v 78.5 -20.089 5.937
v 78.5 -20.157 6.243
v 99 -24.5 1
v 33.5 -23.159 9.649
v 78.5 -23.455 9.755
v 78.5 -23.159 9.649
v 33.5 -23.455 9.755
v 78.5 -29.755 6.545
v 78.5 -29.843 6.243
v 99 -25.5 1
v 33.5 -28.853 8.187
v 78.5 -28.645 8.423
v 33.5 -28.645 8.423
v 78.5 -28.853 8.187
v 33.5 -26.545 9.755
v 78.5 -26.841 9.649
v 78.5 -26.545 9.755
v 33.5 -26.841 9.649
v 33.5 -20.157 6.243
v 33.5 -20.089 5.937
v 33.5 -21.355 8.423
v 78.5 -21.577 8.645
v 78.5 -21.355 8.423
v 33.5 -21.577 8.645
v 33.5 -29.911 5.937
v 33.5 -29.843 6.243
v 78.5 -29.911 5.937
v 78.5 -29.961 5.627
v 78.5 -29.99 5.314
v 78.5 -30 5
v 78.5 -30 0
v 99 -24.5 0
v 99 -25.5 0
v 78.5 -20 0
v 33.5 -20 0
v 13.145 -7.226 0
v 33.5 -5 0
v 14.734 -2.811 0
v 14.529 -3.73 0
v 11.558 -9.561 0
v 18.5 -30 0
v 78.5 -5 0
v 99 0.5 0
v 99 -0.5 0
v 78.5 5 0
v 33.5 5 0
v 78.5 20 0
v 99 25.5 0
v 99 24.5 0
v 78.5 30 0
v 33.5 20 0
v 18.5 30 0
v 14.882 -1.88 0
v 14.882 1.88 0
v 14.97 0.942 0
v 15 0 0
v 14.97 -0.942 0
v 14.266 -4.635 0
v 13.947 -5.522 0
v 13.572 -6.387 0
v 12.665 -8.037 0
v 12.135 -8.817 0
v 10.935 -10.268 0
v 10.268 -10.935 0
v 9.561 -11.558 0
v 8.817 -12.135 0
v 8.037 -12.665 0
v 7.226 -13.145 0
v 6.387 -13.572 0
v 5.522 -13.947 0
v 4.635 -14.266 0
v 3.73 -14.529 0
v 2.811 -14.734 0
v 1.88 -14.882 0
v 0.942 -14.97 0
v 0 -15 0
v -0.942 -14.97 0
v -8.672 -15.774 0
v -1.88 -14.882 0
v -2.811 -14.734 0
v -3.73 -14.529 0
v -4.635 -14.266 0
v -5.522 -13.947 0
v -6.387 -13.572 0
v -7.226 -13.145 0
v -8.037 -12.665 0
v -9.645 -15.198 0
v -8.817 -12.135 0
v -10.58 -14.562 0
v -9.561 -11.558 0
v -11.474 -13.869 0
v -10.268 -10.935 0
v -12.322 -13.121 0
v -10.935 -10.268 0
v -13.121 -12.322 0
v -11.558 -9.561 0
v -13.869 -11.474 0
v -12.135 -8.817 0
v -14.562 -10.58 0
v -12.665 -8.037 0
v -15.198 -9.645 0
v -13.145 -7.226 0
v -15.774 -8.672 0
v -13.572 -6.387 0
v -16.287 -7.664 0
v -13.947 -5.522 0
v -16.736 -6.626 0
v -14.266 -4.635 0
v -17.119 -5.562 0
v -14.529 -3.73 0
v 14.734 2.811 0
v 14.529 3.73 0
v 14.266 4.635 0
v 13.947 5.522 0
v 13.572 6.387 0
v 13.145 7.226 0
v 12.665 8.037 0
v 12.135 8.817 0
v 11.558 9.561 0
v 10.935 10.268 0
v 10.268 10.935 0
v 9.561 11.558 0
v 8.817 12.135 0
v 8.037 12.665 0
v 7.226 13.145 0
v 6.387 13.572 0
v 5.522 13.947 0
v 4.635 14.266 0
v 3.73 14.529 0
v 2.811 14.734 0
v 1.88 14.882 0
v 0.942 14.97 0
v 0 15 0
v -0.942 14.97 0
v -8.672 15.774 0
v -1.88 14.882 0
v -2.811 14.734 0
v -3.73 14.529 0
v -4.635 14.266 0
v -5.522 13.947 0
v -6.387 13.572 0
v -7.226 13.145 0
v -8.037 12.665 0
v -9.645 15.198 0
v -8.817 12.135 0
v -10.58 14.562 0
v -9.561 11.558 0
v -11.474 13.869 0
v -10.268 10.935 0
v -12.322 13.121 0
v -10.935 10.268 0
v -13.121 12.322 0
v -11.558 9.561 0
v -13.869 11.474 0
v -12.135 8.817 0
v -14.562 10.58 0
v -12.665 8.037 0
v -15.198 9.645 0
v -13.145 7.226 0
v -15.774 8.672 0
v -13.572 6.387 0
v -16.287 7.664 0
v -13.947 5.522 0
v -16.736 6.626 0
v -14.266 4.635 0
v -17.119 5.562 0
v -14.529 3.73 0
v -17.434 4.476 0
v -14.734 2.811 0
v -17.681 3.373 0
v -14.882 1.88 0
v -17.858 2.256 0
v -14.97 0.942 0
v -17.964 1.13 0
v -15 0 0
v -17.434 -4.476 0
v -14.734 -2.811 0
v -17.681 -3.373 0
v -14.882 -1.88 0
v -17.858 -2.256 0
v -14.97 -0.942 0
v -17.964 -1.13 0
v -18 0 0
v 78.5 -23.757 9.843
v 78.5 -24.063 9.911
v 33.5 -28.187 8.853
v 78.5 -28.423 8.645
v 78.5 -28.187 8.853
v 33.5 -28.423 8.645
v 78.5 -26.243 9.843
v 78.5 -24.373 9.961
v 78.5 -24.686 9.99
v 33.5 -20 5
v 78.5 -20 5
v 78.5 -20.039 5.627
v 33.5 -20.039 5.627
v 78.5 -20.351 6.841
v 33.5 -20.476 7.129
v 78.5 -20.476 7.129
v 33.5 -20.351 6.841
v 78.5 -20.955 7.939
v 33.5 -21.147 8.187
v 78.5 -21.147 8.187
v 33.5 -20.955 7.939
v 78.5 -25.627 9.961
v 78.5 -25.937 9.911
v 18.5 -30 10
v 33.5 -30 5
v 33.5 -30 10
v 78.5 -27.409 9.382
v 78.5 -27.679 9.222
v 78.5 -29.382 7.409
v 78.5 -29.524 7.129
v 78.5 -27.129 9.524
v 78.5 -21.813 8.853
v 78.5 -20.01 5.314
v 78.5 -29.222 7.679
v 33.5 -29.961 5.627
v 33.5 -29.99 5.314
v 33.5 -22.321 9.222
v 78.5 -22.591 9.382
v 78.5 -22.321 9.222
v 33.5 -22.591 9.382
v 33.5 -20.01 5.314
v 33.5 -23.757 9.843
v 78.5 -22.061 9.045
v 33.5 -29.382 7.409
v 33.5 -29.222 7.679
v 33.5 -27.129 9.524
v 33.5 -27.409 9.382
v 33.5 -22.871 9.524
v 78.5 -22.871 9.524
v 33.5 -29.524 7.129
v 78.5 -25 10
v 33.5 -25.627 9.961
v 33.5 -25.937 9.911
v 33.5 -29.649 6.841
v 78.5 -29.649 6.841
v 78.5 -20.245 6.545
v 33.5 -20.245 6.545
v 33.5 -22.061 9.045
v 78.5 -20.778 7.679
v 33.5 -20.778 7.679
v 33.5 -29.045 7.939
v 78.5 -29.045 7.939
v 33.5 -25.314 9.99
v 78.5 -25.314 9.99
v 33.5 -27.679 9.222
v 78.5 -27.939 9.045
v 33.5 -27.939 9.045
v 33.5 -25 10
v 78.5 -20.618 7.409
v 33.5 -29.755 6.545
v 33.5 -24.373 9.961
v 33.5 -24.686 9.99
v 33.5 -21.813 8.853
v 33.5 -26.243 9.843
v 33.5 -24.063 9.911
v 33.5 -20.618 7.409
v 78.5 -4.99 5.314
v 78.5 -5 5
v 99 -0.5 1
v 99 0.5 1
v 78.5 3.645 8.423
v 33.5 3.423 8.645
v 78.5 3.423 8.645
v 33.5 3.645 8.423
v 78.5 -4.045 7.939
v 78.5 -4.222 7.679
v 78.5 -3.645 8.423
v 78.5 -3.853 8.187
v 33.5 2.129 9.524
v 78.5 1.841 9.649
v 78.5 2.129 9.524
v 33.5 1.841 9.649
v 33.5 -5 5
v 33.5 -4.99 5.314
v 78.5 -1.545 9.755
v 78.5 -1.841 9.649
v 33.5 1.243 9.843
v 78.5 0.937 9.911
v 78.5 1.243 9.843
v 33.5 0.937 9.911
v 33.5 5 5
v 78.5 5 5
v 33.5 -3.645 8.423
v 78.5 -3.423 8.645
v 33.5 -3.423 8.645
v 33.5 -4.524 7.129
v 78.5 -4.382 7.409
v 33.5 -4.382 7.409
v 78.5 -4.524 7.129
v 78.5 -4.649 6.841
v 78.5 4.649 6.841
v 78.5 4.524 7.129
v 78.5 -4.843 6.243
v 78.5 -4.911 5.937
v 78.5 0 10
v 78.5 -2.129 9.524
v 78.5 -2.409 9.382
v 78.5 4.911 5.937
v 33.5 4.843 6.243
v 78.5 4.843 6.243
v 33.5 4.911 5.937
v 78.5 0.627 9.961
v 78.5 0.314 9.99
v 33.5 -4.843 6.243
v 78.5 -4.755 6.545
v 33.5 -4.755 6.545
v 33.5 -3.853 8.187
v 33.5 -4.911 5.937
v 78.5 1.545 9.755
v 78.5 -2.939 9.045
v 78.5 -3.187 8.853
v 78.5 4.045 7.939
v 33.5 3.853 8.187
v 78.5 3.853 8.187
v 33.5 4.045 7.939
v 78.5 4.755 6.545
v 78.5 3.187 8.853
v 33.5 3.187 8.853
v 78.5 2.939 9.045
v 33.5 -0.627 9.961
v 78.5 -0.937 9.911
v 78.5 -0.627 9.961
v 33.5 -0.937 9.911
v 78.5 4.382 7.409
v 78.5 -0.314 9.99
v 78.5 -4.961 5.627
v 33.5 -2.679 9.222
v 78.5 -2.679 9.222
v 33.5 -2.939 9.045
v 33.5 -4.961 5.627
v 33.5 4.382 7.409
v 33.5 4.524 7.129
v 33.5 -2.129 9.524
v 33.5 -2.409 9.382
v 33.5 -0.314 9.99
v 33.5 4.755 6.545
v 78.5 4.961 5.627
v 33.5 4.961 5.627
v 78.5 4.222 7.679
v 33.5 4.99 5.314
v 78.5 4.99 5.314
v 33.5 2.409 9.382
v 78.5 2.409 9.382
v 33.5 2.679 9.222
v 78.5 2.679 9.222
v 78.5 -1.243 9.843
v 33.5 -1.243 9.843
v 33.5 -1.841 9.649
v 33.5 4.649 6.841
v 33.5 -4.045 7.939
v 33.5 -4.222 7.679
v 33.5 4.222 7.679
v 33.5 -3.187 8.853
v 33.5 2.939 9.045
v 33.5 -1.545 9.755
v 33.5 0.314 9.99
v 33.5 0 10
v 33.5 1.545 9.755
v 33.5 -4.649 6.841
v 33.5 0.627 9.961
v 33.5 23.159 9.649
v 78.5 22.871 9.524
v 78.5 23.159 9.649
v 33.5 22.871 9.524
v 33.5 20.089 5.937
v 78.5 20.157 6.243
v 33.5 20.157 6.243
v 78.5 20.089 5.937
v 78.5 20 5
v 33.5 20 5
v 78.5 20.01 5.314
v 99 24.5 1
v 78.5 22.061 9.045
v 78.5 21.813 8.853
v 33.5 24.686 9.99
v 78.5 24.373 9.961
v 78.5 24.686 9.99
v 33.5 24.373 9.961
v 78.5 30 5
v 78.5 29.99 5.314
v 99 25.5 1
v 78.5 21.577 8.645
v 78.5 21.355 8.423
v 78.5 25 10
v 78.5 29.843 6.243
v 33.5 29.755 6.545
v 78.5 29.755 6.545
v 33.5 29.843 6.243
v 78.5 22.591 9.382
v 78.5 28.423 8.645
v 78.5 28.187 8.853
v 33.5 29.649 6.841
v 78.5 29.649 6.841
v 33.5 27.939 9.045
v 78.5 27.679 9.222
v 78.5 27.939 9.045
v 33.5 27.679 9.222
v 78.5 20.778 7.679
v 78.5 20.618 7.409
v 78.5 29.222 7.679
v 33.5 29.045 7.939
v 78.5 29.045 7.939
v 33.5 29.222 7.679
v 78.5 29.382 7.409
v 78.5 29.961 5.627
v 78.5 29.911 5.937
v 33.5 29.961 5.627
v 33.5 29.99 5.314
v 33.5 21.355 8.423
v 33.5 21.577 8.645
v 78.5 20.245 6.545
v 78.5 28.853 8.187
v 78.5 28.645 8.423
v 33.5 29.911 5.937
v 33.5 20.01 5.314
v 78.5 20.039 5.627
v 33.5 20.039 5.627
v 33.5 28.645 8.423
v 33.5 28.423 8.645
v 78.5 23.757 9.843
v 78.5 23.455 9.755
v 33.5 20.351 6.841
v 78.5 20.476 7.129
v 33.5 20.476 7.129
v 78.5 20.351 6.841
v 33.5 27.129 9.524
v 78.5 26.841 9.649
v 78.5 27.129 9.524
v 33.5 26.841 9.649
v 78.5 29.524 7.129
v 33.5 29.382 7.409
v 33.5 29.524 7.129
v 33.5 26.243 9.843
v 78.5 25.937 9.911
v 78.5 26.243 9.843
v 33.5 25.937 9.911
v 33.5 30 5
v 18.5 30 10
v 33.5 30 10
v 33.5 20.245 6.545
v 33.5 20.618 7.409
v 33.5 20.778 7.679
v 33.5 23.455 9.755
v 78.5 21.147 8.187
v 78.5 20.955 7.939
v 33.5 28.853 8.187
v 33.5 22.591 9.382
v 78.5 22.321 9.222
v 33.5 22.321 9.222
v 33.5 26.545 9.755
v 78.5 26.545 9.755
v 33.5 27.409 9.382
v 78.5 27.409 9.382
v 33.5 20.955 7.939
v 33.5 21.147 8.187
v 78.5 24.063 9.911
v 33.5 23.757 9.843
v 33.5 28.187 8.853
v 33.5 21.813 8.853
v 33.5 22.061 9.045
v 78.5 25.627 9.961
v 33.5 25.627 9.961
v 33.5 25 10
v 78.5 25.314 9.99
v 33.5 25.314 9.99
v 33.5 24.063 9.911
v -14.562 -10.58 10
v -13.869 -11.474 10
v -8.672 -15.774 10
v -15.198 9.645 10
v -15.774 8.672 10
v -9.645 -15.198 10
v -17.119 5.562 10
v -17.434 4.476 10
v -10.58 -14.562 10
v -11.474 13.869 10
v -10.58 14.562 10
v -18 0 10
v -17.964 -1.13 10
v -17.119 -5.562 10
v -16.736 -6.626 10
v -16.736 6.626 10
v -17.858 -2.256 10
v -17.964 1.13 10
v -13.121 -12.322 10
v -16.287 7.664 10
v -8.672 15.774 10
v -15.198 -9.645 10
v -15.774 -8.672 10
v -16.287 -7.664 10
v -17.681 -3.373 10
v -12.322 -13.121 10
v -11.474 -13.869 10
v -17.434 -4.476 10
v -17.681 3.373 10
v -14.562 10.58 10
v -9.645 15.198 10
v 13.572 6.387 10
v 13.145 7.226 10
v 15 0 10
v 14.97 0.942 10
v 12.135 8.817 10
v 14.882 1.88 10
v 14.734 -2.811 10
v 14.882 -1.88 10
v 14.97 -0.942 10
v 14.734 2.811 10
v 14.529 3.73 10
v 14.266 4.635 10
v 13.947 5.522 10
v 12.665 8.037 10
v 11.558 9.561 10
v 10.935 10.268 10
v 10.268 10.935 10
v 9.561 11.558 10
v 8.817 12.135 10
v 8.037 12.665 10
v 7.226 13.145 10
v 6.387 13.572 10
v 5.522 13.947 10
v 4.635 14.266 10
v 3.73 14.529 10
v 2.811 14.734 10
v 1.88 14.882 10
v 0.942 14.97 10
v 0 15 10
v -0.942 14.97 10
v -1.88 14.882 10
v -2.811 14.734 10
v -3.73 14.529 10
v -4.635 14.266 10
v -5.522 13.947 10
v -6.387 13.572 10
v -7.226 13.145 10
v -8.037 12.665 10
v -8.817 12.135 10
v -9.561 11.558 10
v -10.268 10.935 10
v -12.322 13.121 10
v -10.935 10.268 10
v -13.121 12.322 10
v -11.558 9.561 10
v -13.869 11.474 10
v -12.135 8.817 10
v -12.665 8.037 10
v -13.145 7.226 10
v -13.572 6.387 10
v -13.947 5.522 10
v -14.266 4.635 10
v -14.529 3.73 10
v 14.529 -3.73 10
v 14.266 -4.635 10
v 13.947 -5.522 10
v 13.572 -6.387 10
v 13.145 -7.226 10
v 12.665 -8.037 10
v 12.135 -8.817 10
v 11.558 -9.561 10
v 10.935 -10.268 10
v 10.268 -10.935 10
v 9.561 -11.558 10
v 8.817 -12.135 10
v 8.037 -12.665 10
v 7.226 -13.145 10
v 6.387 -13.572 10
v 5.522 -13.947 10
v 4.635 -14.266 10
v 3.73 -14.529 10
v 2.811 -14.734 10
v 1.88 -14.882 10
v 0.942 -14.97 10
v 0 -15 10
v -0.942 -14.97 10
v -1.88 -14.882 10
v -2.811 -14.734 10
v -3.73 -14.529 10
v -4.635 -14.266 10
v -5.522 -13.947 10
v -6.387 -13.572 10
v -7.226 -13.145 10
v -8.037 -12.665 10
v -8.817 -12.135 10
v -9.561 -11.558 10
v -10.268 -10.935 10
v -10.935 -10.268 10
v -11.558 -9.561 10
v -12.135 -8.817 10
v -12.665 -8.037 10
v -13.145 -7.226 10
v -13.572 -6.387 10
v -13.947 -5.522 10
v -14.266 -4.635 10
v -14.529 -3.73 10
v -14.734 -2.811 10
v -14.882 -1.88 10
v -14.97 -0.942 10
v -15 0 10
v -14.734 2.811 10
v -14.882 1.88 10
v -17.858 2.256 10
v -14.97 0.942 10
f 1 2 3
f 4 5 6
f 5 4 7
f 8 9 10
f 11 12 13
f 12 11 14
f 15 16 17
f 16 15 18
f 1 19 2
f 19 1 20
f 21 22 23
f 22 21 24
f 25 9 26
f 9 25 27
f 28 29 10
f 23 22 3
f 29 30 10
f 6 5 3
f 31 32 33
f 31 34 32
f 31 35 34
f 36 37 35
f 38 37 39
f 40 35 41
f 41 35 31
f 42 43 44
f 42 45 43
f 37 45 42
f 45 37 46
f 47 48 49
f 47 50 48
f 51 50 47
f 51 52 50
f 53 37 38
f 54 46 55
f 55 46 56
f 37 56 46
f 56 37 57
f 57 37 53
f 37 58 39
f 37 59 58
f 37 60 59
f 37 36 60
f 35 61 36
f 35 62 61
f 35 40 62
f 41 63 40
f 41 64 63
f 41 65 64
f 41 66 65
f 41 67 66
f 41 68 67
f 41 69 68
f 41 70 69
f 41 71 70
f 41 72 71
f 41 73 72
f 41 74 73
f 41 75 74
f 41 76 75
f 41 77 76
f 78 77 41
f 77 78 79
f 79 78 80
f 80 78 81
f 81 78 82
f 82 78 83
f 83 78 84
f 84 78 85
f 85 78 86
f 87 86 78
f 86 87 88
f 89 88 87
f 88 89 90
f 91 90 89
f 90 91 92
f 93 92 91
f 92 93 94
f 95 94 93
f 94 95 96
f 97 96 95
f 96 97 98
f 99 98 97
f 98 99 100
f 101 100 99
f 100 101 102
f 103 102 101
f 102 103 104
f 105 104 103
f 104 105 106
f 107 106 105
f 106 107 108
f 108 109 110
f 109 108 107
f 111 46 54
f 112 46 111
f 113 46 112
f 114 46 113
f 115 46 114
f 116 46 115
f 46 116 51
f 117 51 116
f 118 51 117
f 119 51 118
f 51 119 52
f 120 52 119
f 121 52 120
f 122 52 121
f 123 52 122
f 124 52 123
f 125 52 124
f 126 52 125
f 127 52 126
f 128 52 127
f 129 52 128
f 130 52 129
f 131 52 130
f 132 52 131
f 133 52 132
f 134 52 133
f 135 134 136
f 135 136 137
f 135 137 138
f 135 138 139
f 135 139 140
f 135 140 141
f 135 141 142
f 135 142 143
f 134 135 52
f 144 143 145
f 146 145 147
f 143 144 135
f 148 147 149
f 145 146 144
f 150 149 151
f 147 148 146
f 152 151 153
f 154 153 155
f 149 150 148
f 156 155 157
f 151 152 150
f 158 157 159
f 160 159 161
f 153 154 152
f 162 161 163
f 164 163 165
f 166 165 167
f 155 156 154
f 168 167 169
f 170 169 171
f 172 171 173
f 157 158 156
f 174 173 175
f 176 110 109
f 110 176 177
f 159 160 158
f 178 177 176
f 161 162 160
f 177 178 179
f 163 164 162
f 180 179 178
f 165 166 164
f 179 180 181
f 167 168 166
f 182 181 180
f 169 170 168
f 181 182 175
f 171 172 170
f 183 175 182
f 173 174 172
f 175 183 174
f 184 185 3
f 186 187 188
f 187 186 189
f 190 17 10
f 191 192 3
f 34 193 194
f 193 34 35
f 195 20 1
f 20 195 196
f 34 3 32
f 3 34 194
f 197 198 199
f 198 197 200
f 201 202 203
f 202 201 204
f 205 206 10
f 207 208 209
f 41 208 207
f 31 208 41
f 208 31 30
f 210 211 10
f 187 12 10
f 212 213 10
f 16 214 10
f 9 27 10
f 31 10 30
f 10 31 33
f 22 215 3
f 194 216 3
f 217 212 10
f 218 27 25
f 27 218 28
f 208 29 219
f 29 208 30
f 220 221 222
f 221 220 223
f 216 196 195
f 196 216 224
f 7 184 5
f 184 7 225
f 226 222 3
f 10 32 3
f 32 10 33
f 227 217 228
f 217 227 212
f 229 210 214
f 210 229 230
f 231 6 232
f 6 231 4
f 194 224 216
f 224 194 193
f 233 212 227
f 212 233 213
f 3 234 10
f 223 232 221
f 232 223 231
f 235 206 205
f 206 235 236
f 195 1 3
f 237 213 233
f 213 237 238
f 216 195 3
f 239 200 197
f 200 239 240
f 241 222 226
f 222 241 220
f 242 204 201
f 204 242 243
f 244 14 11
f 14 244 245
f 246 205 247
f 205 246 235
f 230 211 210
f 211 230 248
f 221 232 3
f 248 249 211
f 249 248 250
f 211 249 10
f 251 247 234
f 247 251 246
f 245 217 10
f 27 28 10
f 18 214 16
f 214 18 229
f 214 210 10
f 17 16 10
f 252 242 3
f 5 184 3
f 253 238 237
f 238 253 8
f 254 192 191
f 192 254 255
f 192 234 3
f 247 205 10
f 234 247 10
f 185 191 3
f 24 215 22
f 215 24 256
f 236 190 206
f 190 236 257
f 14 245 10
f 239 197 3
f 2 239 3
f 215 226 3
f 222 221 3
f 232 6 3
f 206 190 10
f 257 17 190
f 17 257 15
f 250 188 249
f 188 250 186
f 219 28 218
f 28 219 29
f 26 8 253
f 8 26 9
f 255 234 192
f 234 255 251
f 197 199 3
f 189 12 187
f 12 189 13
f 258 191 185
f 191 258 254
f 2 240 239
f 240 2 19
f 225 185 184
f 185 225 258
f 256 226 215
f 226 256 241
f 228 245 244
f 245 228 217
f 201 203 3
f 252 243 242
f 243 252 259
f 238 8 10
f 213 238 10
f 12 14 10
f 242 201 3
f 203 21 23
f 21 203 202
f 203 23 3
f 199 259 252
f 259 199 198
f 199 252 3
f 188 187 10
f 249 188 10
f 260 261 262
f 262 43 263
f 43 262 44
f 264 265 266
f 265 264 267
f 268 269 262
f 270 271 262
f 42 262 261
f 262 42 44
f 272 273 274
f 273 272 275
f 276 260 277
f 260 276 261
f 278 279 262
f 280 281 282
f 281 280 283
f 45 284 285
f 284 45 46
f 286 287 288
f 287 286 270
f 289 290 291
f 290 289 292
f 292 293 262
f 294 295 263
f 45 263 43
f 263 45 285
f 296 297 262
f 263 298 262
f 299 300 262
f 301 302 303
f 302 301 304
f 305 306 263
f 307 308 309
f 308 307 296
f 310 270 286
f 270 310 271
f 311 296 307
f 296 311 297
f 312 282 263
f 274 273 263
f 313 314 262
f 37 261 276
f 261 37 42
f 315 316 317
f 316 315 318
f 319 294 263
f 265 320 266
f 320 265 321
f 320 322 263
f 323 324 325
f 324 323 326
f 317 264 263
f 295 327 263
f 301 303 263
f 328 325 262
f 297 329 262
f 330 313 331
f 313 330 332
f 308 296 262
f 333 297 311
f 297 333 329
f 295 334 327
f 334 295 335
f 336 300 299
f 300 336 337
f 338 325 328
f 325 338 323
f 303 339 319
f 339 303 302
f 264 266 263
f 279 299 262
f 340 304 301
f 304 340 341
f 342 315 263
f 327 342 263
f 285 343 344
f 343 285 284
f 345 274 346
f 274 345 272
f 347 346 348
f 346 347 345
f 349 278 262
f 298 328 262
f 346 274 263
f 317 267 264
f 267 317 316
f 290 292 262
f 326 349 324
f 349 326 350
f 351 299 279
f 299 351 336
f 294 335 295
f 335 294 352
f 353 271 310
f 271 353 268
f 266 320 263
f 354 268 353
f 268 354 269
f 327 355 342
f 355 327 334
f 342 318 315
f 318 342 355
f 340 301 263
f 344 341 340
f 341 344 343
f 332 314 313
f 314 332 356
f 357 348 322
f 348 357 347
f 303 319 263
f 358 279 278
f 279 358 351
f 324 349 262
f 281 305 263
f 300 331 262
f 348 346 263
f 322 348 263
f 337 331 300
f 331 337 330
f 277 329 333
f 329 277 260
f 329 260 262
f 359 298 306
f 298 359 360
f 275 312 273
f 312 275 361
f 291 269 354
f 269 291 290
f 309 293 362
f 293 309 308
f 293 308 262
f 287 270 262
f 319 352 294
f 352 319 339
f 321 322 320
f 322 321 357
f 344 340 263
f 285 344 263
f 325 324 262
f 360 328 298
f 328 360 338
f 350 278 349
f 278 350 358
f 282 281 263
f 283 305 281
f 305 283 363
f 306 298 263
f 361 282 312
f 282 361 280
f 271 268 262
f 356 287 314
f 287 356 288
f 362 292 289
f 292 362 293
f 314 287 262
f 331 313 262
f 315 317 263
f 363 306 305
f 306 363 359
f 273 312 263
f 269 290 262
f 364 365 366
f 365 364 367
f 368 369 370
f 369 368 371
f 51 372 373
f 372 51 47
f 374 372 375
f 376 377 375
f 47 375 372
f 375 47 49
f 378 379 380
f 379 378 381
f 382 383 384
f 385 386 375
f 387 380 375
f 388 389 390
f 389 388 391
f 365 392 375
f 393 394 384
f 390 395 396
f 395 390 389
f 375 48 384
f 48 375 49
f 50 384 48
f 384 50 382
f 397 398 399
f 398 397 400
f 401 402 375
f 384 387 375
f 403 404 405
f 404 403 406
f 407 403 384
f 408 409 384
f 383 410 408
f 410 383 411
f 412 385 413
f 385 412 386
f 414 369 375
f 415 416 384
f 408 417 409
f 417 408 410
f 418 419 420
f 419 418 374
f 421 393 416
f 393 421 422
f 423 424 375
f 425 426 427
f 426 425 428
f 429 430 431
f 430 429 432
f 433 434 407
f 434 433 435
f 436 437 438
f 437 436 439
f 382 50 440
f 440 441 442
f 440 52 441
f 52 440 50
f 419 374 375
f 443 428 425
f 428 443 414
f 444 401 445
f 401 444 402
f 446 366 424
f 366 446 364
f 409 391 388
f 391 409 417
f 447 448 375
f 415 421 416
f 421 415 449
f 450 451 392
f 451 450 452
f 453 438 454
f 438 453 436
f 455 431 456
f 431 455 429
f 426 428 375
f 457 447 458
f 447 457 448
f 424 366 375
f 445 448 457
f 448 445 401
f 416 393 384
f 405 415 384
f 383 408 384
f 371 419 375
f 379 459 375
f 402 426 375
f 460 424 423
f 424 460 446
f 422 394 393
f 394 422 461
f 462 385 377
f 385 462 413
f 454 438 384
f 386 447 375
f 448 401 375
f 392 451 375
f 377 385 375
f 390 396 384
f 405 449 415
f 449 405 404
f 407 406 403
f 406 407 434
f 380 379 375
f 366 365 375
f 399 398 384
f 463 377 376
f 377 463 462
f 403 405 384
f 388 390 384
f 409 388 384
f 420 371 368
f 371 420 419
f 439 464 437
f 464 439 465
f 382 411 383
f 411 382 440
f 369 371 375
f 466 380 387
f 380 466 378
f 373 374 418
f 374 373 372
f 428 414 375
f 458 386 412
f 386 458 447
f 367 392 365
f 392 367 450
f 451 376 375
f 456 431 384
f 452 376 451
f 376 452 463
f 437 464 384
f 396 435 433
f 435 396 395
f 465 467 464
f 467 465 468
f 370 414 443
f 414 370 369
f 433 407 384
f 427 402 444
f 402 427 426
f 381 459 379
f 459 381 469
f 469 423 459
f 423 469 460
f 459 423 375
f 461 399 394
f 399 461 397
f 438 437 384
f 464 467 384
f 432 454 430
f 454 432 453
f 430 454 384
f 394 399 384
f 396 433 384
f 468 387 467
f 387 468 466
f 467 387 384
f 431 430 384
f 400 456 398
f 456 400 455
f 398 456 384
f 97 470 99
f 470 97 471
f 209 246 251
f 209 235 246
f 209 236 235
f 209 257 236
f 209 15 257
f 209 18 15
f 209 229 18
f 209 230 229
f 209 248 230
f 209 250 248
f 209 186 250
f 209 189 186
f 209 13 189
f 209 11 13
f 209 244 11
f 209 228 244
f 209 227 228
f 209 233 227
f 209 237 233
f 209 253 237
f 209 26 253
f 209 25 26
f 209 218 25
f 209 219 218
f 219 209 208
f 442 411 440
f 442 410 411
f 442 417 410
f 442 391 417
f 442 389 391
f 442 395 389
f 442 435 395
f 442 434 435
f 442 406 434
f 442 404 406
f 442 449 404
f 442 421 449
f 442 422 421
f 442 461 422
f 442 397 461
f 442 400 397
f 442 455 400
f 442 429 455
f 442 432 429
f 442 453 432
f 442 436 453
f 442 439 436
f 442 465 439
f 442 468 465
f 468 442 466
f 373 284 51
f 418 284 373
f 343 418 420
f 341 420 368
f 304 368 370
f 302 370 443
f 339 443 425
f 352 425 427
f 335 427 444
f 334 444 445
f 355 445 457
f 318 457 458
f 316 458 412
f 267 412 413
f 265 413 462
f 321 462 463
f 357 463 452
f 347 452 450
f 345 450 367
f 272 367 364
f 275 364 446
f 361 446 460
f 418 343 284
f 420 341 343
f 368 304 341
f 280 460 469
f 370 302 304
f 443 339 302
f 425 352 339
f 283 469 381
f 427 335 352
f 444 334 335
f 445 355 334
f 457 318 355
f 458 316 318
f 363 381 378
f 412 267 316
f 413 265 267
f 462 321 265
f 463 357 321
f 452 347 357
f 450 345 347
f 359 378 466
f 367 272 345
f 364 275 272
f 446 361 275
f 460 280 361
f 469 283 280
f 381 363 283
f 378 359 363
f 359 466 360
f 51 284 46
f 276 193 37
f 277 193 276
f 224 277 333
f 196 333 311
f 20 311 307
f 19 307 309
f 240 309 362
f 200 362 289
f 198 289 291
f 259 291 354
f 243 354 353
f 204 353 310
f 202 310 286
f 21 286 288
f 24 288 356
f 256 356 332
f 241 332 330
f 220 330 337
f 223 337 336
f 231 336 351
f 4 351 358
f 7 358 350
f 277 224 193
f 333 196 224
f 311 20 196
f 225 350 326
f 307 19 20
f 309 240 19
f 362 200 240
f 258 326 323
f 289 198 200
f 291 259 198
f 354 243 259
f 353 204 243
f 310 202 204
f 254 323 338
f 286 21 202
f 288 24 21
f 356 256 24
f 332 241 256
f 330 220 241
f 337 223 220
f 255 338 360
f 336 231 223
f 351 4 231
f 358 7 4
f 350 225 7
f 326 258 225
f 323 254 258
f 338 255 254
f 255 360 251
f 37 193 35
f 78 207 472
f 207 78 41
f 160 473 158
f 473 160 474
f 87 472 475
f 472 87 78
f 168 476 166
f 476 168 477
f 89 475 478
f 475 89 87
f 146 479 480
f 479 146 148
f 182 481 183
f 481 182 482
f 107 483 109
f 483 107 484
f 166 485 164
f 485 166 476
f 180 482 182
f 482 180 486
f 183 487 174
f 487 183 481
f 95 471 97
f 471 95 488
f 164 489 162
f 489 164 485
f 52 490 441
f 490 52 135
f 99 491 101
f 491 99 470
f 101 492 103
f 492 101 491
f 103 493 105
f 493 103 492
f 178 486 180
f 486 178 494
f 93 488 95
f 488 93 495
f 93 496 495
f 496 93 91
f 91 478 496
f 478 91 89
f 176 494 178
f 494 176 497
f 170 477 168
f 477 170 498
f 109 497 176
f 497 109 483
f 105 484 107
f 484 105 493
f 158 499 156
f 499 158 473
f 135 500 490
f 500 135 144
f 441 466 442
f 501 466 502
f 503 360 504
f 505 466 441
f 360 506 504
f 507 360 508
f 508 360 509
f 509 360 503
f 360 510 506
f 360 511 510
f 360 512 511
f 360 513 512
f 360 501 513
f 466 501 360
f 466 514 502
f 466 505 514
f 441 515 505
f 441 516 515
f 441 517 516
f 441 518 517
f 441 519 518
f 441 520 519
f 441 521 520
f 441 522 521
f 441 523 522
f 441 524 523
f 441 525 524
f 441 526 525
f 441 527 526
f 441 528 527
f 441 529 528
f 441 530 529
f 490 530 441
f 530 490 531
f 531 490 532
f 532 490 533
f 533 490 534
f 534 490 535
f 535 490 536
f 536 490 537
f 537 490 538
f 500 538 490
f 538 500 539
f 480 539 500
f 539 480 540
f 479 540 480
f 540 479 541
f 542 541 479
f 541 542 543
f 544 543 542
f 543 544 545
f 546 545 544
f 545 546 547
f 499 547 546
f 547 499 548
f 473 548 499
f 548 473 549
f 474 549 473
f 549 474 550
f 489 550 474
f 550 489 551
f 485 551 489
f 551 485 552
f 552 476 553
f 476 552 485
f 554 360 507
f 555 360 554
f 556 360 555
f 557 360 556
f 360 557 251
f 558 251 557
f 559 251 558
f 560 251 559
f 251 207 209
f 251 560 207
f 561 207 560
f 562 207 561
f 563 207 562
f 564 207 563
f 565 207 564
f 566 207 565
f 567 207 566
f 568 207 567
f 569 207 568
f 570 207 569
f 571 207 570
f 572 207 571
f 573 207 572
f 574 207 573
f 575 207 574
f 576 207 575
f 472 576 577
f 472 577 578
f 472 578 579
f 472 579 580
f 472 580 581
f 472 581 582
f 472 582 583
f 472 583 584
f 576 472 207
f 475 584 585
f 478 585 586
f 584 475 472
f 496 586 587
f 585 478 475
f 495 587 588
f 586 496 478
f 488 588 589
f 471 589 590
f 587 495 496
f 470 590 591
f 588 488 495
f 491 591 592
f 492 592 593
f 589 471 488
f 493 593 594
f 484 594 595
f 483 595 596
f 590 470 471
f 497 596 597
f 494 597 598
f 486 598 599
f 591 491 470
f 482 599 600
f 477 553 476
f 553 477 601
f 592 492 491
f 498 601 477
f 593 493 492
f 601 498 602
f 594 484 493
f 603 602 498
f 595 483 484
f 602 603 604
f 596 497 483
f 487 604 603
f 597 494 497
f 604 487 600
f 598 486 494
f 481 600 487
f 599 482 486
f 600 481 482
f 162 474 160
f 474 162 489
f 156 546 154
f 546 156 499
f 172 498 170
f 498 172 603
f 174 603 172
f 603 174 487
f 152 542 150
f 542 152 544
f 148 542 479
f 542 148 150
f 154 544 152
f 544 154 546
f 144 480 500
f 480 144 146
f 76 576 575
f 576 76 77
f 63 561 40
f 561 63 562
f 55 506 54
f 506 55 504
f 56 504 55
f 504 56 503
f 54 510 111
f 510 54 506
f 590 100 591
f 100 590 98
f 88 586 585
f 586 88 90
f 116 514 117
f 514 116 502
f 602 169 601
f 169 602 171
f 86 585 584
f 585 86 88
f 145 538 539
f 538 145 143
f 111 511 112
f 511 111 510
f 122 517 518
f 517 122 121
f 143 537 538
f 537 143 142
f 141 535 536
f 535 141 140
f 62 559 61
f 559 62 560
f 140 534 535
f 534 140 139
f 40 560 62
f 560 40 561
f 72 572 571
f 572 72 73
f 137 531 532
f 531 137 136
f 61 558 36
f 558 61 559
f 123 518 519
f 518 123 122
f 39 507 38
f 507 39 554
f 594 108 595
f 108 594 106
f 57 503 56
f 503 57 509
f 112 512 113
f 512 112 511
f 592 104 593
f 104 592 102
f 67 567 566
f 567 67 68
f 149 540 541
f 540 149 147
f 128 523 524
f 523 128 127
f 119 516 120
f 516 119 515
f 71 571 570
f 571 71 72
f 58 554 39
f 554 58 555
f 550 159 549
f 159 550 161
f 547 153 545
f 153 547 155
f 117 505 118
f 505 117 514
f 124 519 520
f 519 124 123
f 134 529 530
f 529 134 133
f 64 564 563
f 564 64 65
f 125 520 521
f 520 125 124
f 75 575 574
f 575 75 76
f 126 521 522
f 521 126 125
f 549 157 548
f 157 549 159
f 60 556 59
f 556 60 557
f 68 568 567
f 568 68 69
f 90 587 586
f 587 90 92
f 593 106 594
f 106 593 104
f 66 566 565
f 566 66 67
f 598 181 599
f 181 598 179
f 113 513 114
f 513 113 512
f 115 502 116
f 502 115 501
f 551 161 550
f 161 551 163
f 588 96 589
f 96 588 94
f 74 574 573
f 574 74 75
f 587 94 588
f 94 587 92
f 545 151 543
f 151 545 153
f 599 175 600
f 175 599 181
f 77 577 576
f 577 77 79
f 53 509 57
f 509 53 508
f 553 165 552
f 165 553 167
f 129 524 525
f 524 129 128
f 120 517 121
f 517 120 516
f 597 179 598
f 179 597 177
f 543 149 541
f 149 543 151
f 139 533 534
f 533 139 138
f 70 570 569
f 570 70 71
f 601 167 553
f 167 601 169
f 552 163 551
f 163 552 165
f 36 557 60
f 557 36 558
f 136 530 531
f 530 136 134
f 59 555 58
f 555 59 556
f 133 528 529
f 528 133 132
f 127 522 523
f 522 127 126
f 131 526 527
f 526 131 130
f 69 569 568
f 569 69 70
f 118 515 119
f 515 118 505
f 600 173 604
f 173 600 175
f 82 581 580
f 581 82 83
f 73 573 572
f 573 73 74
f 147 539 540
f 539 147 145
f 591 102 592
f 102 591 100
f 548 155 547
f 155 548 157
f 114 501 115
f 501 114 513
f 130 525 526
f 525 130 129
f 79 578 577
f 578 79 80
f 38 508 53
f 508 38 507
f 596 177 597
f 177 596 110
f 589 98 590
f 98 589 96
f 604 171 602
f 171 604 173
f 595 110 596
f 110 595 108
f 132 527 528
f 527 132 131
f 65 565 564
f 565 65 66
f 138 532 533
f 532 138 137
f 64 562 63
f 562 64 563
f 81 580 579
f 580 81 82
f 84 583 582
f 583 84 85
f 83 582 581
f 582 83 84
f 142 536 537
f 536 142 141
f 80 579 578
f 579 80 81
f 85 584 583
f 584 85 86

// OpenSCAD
//custom rake

// diameter handle
d=30;
// thickness of handle holder
t=3;
// height of handle holder
h=10;

// number of teeth +1
n=2;
// radius of teeth
r=5;
//spacing of teeth
s=15;
//length of teeth
l=50;
// pointiness
p=20;


//calls

translate([12,-n/2*(2*r+s),0])rake();
handleholder();

module handleholder(){
difference(){
hull(){
translate([d*2/3+t*2,0,h/2])cube([d/2,n*(2*r+s)+2*r,h],center=true); //manifold
translate([0,0,h/2])cylinder(h,d/2+t,d/2+t,center=true,$fn=100);
		}
	translate([0,0,h/2])cylinder(h+1,d/2,d/2,center=true,$fn=100);
			}
				}
					


module rake(){
	for(i=[0:n]) {
hull(){
union(){
		translate([l/2+(d+t)/2,i*(s+2*r),r])rotate([0,90,0])cylinder(l,r,r,center=true,$fn=100);
		translate([l/2+(d+t)/2,i*(s+2*r),r/2])cube([l,r*2,r], center=true);
}
translate([p+l+(d+t)/2,i*(s+2*r),0.5])cube([1,1,1], center=true);
				}
	
			}
}
